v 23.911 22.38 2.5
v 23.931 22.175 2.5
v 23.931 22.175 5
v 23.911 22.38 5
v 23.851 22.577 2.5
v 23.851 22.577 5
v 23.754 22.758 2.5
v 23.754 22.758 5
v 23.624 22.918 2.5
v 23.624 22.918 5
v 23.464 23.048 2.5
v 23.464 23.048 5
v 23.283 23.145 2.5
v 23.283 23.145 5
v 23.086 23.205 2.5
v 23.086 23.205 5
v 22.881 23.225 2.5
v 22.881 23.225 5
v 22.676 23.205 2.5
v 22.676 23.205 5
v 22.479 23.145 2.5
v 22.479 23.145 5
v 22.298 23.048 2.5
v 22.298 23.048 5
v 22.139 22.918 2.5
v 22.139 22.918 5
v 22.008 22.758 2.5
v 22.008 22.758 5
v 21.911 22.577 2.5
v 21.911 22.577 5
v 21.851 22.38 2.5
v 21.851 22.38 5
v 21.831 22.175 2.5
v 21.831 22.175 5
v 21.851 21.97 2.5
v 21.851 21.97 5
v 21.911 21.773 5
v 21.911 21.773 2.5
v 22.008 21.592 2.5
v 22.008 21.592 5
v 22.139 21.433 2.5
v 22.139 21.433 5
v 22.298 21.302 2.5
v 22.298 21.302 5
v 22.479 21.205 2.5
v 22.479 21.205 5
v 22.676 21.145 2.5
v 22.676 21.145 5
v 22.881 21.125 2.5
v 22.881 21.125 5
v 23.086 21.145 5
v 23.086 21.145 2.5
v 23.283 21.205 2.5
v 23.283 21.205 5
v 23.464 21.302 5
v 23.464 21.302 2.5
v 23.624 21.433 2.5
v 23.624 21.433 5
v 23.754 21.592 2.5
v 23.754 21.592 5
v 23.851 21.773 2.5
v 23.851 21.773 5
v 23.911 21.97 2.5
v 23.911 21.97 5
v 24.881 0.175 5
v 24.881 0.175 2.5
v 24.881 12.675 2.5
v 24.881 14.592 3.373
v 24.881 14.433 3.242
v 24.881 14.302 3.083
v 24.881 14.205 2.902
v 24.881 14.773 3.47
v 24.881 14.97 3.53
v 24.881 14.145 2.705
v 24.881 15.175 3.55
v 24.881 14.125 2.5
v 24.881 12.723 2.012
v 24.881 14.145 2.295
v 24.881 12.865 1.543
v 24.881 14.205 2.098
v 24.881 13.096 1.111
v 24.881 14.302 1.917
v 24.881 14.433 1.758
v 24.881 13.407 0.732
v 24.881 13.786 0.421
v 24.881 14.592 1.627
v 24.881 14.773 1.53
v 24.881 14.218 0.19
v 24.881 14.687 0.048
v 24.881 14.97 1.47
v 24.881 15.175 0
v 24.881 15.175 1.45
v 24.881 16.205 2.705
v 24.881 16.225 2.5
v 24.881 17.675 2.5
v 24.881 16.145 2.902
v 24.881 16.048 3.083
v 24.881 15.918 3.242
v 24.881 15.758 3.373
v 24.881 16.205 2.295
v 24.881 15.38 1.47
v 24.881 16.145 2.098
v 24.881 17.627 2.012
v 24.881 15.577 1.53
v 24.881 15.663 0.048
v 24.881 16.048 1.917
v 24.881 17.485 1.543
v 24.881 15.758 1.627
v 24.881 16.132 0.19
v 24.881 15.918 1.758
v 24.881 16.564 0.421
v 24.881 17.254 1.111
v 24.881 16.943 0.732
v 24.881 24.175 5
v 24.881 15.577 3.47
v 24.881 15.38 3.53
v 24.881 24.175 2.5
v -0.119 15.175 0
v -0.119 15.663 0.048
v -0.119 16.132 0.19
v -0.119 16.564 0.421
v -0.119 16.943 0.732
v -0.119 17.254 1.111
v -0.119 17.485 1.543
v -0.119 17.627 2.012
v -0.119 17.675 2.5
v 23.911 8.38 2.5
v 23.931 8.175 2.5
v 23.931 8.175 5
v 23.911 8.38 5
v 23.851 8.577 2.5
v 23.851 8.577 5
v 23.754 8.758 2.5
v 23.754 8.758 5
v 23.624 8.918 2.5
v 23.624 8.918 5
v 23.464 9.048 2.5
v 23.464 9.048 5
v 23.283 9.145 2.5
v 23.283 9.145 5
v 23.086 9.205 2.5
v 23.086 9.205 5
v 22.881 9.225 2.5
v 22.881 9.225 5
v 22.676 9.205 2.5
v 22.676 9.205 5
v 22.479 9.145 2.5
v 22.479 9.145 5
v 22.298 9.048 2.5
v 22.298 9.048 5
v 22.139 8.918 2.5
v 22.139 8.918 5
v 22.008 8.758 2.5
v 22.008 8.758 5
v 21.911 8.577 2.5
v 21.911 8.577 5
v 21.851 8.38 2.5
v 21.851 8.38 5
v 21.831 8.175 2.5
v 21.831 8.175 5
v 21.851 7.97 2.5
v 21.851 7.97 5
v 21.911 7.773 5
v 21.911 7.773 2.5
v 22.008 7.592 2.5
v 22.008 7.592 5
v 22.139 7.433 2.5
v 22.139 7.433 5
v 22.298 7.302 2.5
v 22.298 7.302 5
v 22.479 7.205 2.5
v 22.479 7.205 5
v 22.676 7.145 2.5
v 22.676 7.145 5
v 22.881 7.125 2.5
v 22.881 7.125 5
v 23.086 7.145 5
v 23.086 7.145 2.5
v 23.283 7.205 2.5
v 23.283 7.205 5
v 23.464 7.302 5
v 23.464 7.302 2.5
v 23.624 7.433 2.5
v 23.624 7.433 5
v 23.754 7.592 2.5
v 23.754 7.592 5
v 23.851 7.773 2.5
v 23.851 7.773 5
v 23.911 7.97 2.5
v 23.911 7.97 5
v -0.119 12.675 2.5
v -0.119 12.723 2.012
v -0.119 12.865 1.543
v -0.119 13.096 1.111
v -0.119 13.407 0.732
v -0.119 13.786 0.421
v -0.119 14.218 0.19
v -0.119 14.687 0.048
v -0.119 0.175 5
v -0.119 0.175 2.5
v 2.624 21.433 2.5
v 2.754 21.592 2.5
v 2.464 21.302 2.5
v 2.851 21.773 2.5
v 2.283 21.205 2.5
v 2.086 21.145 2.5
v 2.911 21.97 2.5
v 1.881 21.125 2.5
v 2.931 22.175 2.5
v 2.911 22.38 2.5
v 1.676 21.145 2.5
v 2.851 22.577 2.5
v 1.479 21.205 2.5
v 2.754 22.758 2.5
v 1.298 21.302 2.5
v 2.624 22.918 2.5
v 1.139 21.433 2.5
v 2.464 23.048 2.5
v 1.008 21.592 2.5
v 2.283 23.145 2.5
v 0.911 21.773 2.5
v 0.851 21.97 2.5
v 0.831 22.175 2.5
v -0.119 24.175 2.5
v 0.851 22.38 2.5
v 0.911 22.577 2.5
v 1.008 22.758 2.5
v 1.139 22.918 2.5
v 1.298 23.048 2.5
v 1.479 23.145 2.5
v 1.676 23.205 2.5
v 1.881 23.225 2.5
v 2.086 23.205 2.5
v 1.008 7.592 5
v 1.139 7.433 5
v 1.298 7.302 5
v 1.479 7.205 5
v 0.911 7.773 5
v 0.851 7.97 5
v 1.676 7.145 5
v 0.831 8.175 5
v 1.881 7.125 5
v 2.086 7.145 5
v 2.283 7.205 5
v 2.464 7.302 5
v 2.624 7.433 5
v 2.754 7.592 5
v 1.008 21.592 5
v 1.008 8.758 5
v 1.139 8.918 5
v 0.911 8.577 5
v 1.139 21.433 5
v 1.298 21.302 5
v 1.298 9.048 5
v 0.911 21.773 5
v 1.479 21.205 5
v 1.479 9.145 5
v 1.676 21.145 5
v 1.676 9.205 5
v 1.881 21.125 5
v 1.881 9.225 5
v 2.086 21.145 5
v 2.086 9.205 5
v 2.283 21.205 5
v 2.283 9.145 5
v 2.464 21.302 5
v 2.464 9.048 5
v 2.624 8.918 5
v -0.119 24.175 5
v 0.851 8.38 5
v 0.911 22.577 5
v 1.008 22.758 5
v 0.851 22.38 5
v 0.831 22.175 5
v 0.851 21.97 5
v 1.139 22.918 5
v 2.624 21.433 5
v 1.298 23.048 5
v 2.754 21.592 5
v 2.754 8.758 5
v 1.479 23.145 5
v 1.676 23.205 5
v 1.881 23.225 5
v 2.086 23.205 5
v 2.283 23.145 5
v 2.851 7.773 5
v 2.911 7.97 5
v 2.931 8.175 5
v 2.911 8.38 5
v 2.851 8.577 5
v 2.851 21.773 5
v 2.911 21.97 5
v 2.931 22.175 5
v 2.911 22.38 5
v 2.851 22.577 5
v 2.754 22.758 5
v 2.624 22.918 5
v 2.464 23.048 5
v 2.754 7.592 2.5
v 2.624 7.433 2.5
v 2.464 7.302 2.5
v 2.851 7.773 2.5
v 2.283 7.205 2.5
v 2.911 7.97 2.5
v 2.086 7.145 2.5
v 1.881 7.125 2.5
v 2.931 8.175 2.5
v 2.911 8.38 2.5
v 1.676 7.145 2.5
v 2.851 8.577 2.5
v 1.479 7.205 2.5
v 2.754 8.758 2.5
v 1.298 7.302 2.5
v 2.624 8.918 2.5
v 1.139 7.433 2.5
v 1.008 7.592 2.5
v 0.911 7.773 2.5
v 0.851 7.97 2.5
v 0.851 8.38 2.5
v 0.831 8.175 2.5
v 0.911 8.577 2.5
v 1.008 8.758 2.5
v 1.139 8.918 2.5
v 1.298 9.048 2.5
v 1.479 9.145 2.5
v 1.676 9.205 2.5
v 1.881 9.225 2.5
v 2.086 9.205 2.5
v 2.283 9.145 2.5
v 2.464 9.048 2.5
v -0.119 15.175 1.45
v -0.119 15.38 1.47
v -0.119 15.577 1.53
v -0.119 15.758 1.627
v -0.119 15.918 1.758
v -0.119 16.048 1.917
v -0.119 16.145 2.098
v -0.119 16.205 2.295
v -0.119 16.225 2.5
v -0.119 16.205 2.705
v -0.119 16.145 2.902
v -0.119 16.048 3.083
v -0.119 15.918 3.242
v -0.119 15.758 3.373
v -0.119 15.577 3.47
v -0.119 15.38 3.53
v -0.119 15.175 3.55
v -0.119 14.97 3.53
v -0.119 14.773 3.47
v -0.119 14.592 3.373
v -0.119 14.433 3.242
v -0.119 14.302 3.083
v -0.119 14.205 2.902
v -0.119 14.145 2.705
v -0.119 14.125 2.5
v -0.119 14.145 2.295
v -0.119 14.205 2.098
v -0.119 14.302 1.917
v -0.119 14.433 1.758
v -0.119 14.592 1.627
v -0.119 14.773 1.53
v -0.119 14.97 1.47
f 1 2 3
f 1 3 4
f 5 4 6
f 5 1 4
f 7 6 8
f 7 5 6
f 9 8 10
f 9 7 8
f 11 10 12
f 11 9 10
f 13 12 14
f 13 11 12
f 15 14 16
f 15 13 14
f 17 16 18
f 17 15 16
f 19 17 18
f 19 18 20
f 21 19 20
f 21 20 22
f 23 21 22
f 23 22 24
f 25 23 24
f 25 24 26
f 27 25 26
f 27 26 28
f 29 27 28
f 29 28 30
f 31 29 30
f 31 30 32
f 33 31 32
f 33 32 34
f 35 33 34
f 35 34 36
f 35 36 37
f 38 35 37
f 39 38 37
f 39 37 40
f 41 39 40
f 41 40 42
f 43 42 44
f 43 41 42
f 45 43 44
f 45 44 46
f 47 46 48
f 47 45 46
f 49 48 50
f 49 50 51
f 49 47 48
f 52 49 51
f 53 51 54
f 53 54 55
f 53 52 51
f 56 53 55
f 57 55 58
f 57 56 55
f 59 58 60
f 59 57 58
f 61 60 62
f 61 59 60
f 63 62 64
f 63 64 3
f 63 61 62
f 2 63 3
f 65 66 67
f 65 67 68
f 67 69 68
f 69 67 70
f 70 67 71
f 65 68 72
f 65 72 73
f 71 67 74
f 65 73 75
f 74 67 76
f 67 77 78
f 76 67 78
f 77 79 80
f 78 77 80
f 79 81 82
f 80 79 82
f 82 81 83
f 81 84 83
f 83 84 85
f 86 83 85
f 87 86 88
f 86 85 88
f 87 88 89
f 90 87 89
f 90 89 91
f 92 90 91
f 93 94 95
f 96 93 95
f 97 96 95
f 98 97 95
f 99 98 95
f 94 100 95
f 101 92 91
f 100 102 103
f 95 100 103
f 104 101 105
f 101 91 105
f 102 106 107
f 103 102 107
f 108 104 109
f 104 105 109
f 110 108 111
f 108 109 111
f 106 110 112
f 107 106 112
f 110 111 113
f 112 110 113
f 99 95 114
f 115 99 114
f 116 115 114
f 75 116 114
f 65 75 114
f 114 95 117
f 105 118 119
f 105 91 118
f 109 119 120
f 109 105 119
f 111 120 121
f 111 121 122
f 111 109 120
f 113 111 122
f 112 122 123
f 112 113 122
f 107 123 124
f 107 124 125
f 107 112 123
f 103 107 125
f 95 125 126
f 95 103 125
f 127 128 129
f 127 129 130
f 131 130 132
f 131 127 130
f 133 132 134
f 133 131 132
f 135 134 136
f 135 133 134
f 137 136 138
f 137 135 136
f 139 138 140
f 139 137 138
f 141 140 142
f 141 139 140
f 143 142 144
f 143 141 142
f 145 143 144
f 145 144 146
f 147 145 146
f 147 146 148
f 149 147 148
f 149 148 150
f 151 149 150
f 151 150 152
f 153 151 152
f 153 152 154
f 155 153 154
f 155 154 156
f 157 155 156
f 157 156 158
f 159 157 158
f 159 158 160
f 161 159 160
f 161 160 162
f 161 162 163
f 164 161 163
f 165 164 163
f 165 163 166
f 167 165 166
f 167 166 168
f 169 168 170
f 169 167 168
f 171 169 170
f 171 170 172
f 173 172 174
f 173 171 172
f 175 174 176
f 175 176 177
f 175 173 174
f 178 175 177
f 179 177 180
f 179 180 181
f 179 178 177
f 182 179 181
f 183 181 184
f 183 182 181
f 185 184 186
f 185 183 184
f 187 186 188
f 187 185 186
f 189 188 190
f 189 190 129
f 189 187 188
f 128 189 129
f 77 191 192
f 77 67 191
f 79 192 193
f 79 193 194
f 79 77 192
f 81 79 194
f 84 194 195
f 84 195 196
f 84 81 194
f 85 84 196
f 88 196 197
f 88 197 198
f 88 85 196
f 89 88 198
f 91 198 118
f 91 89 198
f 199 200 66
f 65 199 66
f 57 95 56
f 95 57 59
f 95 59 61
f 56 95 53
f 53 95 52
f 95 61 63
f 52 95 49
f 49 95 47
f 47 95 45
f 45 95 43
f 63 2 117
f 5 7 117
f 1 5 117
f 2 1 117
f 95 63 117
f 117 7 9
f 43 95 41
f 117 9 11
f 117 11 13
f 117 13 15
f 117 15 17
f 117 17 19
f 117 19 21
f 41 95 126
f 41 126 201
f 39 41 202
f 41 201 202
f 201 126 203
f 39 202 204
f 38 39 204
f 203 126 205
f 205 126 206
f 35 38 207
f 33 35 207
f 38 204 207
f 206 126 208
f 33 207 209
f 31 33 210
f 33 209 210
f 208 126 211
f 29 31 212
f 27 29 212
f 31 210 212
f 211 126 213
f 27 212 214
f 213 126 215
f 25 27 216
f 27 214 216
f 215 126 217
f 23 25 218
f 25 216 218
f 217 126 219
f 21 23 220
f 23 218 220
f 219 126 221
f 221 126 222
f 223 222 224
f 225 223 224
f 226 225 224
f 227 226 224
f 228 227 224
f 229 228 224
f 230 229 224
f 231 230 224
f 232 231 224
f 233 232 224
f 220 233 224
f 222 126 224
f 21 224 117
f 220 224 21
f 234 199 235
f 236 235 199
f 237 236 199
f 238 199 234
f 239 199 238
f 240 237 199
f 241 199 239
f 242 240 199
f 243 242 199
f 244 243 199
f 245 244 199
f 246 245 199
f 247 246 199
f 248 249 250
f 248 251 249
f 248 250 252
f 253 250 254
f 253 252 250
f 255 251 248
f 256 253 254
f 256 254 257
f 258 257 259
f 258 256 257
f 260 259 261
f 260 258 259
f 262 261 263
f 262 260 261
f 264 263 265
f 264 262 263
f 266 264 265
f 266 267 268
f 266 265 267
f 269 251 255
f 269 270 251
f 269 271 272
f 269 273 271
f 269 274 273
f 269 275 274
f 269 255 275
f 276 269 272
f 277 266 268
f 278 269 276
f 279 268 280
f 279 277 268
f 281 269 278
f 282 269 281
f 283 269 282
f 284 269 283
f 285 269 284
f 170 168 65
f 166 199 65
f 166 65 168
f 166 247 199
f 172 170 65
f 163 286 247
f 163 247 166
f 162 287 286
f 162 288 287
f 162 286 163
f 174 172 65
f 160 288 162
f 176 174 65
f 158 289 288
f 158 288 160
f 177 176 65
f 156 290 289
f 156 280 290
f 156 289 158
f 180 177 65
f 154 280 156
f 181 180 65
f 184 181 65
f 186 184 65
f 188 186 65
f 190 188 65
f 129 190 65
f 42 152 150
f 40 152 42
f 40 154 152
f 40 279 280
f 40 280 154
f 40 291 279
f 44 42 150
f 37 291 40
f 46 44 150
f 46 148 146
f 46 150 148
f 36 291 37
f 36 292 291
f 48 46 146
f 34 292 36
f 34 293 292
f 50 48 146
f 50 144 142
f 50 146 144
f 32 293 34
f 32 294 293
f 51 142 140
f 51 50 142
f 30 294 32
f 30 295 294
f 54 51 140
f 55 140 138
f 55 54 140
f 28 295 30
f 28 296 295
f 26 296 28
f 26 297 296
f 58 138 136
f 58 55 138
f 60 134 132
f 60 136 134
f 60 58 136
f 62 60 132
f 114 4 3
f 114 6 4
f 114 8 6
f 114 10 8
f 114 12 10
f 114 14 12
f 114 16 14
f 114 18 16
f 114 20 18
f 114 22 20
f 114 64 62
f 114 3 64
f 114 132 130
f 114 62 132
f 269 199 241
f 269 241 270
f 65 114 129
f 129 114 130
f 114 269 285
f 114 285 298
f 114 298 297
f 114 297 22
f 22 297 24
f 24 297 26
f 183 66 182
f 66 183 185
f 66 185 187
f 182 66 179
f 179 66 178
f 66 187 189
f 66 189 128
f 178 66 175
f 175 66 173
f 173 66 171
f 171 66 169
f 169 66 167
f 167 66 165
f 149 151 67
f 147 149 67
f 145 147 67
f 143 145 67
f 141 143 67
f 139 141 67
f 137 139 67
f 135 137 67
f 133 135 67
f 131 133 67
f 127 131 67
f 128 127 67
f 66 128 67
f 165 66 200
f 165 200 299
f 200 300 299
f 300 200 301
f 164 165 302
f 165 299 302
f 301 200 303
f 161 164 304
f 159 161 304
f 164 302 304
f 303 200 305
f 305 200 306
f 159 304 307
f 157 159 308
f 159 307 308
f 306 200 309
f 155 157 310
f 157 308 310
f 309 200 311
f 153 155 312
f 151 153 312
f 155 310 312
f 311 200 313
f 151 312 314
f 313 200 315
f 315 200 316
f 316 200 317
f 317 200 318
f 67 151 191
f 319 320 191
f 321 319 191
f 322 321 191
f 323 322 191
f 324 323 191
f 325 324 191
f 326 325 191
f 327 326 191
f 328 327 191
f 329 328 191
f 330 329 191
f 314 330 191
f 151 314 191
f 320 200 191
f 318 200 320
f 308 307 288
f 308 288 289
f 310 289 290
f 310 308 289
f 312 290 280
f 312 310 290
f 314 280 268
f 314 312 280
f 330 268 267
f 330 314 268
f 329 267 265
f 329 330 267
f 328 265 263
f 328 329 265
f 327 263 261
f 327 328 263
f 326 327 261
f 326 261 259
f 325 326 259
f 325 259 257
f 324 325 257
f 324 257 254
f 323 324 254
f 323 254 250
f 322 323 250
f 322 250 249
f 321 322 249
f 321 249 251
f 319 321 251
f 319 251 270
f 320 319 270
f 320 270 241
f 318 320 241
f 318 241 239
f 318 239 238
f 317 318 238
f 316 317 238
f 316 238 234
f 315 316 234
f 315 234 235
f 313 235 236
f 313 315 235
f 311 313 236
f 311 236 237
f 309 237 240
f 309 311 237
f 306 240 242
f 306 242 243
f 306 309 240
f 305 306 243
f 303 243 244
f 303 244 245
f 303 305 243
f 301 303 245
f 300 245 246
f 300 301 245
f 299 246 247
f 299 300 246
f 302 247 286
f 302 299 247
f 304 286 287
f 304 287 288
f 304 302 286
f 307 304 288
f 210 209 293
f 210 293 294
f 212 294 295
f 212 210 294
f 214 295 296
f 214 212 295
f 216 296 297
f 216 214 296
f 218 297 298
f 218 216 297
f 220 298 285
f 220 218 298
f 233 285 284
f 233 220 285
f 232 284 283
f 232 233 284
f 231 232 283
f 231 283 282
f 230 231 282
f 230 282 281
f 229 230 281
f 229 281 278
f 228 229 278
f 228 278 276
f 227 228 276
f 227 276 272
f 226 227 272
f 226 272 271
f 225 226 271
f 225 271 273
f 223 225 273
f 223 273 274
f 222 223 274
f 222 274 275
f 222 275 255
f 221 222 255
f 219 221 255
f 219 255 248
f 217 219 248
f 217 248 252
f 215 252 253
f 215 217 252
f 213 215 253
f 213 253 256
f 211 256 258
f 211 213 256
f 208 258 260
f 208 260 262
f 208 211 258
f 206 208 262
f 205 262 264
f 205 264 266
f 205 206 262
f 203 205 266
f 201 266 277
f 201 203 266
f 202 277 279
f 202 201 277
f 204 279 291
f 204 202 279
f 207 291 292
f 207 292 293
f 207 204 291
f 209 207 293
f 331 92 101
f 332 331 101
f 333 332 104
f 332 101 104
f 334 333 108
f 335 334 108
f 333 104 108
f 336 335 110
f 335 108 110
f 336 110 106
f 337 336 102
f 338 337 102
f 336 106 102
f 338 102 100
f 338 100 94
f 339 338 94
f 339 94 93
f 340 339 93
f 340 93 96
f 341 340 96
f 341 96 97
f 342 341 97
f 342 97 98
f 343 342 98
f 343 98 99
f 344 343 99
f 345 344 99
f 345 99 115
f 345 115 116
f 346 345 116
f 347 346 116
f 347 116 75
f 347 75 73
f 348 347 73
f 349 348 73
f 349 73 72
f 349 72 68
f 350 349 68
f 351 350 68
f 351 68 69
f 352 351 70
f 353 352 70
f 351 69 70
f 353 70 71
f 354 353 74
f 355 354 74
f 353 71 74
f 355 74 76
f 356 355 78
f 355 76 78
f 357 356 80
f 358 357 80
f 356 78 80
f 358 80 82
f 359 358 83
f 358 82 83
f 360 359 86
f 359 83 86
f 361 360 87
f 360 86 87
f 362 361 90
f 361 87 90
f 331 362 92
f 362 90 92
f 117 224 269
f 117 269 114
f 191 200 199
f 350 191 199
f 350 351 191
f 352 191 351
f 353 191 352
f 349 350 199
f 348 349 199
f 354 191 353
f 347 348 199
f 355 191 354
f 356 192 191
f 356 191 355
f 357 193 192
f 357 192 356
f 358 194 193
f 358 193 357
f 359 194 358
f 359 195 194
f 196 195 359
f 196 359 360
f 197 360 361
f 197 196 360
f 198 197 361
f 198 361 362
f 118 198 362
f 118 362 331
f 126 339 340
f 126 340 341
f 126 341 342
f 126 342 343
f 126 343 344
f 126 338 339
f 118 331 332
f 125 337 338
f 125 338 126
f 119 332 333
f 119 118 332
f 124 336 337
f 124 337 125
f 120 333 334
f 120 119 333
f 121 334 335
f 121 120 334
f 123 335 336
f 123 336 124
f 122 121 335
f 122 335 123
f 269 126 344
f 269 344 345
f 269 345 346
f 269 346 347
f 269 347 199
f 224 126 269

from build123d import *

# Parameters (mm, degrees)
SZKIC2_W                    = 25.000000373
SZKIC2_H                    = 24
SZKIC2_R                    = 1.05
DODANIE_WYCI_GNI_CIE1_DEPTH = 5
SZKIC3_R                    = 1.05
WYTNIJ_WYCI_GNI_CIE1_DEPTH  = 36.134524248
SZKIC4_W                    = 2.5
SZKIC4_H                    = 6.5
SZKIC4_H_2                  = 12.5
WYTNIJ_WYCI_GNI_CIE2_DEPTH  = 36.134524248
ZAOKR_GLENIE5_R             = 2.5


with BuildPart() as part:
    # Szkic2 → Dodanie-wyciągnięcie1 (new body)
    with BuildSketch(Plane.XY):
        with Locations((12.381142653, 12.175085843)):
            Rectangle(SZKIC2_W, SZKIC2_H)
        with Locations((22.881142652, 22.175085947)):
            Circle(SZKIC2_R, mode=Mode.SUBTRACT)
        with Locations((22.881142652, 8.175085947)):
            Circle(SZKIC2_R, mode=Mode.SUBTRACT)
        with Locations((1.881142652, 22.175085947)):
            Circle(SZKIC2_R, mode=Mode.SUBTRACT)
        with Locations((1.881142652, 8.175085947)):
            Circle(SZKIC2_R, mode=Mode.SUBTRACT)
    extrude(amount=DODANIE_WYCI_GNI_CIE1_DEPTH)

    # Szkic3 → Wytnij-wyciągnięcie1 (cut, through all)
    with BuildSketch(Plane(origin=(24.881142839, 0, 0), x_dir=(0, 0, -1), z_dir=(1, 0, 0))):
        with Locations((-2.5, 15.175085843)):
            Circle(SZKIC3_R)
    extrude(amount=-WYTNIJ_WYCI_GNI_CIE1_DEPTH, mode=Mode.SUBTRACT)

    # Szkic4 → Wytnij-wyciągnięcie2 (cut, through all)
    with BuildSketch(Plane.ZY.offset(0.118857534)):
        with Locations((1.25, 20.925085843)):
            Rectangle(SZKIC4_W, SZKIC4_H)
        with Locations((1.25, 6.425085843)):
            Rectangle(SZKIC4_W, SZKIC4_H_2)
    extrude(amount=-WYTNIJ_WYCI_GNI_CIE2_DEPTH, mode=Mode.SUBTRACT)

    # Zaokrąglenie5
    zaokr_glenie5_edges = [part.edges().sort_by_distance(p)[0] for p in [
        (12.381142652, 12.675085843, 0),
        (12.381142652, 17.675085843, 0),
    ]]
    fillet(zaokr_glenie5_edges, radius=ZAOKR_GLENIE5_R - 0.0001)  # a hair under: the kernel refuses the full size


solid = part.part
